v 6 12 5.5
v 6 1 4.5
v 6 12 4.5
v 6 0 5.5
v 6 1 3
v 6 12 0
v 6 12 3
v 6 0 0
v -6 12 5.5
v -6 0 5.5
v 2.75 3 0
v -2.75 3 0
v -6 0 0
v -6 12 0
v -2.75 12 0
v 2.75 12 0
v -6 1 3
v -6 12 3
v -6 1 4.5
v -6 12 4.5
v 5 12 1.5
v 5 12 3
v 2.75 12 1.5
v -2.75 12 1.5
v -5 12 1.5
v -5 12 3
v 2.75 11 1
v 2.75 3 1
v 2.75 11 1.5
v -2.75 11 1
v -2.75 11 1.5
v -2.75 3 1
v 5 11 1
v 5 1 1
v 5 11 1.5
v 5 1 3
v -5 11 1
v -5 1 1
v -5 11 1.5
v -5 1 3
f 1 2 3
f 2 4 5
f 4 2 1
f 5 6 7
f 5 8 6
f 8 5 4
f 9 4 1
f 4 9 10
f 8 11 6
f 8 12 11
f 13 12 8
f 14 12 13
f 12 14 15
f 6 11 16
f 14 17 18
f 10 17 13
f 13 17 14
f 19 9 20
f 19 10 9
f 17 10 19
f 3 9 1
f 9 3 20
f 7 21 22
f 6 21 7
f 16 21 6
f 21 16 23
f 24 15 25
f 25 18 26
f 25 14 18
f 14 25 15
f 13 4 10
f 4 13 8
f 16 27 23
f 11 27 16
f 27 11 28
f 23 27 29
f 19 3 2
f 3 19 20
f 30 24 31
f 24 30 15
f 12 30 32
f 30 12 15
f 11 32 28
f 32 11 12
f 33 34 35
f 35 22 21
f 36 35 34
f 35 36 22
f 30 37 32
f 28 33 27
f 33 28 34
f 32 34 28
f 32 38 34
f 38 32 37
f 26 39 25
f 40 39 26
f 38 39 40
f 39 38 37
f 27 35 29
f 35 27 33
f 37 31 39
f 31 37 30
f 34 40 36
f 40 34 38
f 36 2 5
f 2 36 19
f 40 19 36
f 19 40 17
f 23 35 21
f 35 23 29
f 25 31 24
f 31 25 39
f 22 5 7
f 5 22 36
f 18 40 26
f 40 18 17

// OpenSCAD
//translate([-2.5,-2.5,-1]) color([1,0,0]) cube([5,5,1]);
//translate([-5,-5,0]) color([0,0,1]) cube([10,10,1]);

difference() {
    translate([-6,0,0]) cube([12,12,5.5]);
    // Ausschnitt LED
    translate([-2.75,3,0]) cube([5.5,9,4.5]);
    // Auschnitt Platine Innen
    translate([-5,1,1]) cube([10,10,3.5]);
    // Einführung Platine
    translate([-5,1,1.5]) cube([10,11,3]);
    // Kabel seitlich
    translate([-6,1,3]) cube([12,12,1.5]);
}

/*

translate([-5,-4.75,-1]) {
    color([0,0,1]) difference() {        
        // Block für LED Gabel
        cube([11,9.5,2]);
        // Ausschnitt LED
        translate([2.5,2,0]) cube([8.5,5.5,2]);
        // Ausschnitt Platine
        translate([0,0,1]) cube([10,9.5,2]);

    }
}

// Wand
color([1,0,0])  translate([-5.5,-4.75,-1]) cube([0.6,9.5,5.5]);
//Deckel
color([0,1,0]) translate([-5,-4.75,3.5]) cube([11,9.5,1]);

/*
translate([0,0,-15.3])
difference() {
    cube([30.6,20.6,30.6], true);
    translate([-0.3,0,0]) cube([30,19.4,29.4], true);
     cube([5.5,5.5,1.6]);
 }*/
